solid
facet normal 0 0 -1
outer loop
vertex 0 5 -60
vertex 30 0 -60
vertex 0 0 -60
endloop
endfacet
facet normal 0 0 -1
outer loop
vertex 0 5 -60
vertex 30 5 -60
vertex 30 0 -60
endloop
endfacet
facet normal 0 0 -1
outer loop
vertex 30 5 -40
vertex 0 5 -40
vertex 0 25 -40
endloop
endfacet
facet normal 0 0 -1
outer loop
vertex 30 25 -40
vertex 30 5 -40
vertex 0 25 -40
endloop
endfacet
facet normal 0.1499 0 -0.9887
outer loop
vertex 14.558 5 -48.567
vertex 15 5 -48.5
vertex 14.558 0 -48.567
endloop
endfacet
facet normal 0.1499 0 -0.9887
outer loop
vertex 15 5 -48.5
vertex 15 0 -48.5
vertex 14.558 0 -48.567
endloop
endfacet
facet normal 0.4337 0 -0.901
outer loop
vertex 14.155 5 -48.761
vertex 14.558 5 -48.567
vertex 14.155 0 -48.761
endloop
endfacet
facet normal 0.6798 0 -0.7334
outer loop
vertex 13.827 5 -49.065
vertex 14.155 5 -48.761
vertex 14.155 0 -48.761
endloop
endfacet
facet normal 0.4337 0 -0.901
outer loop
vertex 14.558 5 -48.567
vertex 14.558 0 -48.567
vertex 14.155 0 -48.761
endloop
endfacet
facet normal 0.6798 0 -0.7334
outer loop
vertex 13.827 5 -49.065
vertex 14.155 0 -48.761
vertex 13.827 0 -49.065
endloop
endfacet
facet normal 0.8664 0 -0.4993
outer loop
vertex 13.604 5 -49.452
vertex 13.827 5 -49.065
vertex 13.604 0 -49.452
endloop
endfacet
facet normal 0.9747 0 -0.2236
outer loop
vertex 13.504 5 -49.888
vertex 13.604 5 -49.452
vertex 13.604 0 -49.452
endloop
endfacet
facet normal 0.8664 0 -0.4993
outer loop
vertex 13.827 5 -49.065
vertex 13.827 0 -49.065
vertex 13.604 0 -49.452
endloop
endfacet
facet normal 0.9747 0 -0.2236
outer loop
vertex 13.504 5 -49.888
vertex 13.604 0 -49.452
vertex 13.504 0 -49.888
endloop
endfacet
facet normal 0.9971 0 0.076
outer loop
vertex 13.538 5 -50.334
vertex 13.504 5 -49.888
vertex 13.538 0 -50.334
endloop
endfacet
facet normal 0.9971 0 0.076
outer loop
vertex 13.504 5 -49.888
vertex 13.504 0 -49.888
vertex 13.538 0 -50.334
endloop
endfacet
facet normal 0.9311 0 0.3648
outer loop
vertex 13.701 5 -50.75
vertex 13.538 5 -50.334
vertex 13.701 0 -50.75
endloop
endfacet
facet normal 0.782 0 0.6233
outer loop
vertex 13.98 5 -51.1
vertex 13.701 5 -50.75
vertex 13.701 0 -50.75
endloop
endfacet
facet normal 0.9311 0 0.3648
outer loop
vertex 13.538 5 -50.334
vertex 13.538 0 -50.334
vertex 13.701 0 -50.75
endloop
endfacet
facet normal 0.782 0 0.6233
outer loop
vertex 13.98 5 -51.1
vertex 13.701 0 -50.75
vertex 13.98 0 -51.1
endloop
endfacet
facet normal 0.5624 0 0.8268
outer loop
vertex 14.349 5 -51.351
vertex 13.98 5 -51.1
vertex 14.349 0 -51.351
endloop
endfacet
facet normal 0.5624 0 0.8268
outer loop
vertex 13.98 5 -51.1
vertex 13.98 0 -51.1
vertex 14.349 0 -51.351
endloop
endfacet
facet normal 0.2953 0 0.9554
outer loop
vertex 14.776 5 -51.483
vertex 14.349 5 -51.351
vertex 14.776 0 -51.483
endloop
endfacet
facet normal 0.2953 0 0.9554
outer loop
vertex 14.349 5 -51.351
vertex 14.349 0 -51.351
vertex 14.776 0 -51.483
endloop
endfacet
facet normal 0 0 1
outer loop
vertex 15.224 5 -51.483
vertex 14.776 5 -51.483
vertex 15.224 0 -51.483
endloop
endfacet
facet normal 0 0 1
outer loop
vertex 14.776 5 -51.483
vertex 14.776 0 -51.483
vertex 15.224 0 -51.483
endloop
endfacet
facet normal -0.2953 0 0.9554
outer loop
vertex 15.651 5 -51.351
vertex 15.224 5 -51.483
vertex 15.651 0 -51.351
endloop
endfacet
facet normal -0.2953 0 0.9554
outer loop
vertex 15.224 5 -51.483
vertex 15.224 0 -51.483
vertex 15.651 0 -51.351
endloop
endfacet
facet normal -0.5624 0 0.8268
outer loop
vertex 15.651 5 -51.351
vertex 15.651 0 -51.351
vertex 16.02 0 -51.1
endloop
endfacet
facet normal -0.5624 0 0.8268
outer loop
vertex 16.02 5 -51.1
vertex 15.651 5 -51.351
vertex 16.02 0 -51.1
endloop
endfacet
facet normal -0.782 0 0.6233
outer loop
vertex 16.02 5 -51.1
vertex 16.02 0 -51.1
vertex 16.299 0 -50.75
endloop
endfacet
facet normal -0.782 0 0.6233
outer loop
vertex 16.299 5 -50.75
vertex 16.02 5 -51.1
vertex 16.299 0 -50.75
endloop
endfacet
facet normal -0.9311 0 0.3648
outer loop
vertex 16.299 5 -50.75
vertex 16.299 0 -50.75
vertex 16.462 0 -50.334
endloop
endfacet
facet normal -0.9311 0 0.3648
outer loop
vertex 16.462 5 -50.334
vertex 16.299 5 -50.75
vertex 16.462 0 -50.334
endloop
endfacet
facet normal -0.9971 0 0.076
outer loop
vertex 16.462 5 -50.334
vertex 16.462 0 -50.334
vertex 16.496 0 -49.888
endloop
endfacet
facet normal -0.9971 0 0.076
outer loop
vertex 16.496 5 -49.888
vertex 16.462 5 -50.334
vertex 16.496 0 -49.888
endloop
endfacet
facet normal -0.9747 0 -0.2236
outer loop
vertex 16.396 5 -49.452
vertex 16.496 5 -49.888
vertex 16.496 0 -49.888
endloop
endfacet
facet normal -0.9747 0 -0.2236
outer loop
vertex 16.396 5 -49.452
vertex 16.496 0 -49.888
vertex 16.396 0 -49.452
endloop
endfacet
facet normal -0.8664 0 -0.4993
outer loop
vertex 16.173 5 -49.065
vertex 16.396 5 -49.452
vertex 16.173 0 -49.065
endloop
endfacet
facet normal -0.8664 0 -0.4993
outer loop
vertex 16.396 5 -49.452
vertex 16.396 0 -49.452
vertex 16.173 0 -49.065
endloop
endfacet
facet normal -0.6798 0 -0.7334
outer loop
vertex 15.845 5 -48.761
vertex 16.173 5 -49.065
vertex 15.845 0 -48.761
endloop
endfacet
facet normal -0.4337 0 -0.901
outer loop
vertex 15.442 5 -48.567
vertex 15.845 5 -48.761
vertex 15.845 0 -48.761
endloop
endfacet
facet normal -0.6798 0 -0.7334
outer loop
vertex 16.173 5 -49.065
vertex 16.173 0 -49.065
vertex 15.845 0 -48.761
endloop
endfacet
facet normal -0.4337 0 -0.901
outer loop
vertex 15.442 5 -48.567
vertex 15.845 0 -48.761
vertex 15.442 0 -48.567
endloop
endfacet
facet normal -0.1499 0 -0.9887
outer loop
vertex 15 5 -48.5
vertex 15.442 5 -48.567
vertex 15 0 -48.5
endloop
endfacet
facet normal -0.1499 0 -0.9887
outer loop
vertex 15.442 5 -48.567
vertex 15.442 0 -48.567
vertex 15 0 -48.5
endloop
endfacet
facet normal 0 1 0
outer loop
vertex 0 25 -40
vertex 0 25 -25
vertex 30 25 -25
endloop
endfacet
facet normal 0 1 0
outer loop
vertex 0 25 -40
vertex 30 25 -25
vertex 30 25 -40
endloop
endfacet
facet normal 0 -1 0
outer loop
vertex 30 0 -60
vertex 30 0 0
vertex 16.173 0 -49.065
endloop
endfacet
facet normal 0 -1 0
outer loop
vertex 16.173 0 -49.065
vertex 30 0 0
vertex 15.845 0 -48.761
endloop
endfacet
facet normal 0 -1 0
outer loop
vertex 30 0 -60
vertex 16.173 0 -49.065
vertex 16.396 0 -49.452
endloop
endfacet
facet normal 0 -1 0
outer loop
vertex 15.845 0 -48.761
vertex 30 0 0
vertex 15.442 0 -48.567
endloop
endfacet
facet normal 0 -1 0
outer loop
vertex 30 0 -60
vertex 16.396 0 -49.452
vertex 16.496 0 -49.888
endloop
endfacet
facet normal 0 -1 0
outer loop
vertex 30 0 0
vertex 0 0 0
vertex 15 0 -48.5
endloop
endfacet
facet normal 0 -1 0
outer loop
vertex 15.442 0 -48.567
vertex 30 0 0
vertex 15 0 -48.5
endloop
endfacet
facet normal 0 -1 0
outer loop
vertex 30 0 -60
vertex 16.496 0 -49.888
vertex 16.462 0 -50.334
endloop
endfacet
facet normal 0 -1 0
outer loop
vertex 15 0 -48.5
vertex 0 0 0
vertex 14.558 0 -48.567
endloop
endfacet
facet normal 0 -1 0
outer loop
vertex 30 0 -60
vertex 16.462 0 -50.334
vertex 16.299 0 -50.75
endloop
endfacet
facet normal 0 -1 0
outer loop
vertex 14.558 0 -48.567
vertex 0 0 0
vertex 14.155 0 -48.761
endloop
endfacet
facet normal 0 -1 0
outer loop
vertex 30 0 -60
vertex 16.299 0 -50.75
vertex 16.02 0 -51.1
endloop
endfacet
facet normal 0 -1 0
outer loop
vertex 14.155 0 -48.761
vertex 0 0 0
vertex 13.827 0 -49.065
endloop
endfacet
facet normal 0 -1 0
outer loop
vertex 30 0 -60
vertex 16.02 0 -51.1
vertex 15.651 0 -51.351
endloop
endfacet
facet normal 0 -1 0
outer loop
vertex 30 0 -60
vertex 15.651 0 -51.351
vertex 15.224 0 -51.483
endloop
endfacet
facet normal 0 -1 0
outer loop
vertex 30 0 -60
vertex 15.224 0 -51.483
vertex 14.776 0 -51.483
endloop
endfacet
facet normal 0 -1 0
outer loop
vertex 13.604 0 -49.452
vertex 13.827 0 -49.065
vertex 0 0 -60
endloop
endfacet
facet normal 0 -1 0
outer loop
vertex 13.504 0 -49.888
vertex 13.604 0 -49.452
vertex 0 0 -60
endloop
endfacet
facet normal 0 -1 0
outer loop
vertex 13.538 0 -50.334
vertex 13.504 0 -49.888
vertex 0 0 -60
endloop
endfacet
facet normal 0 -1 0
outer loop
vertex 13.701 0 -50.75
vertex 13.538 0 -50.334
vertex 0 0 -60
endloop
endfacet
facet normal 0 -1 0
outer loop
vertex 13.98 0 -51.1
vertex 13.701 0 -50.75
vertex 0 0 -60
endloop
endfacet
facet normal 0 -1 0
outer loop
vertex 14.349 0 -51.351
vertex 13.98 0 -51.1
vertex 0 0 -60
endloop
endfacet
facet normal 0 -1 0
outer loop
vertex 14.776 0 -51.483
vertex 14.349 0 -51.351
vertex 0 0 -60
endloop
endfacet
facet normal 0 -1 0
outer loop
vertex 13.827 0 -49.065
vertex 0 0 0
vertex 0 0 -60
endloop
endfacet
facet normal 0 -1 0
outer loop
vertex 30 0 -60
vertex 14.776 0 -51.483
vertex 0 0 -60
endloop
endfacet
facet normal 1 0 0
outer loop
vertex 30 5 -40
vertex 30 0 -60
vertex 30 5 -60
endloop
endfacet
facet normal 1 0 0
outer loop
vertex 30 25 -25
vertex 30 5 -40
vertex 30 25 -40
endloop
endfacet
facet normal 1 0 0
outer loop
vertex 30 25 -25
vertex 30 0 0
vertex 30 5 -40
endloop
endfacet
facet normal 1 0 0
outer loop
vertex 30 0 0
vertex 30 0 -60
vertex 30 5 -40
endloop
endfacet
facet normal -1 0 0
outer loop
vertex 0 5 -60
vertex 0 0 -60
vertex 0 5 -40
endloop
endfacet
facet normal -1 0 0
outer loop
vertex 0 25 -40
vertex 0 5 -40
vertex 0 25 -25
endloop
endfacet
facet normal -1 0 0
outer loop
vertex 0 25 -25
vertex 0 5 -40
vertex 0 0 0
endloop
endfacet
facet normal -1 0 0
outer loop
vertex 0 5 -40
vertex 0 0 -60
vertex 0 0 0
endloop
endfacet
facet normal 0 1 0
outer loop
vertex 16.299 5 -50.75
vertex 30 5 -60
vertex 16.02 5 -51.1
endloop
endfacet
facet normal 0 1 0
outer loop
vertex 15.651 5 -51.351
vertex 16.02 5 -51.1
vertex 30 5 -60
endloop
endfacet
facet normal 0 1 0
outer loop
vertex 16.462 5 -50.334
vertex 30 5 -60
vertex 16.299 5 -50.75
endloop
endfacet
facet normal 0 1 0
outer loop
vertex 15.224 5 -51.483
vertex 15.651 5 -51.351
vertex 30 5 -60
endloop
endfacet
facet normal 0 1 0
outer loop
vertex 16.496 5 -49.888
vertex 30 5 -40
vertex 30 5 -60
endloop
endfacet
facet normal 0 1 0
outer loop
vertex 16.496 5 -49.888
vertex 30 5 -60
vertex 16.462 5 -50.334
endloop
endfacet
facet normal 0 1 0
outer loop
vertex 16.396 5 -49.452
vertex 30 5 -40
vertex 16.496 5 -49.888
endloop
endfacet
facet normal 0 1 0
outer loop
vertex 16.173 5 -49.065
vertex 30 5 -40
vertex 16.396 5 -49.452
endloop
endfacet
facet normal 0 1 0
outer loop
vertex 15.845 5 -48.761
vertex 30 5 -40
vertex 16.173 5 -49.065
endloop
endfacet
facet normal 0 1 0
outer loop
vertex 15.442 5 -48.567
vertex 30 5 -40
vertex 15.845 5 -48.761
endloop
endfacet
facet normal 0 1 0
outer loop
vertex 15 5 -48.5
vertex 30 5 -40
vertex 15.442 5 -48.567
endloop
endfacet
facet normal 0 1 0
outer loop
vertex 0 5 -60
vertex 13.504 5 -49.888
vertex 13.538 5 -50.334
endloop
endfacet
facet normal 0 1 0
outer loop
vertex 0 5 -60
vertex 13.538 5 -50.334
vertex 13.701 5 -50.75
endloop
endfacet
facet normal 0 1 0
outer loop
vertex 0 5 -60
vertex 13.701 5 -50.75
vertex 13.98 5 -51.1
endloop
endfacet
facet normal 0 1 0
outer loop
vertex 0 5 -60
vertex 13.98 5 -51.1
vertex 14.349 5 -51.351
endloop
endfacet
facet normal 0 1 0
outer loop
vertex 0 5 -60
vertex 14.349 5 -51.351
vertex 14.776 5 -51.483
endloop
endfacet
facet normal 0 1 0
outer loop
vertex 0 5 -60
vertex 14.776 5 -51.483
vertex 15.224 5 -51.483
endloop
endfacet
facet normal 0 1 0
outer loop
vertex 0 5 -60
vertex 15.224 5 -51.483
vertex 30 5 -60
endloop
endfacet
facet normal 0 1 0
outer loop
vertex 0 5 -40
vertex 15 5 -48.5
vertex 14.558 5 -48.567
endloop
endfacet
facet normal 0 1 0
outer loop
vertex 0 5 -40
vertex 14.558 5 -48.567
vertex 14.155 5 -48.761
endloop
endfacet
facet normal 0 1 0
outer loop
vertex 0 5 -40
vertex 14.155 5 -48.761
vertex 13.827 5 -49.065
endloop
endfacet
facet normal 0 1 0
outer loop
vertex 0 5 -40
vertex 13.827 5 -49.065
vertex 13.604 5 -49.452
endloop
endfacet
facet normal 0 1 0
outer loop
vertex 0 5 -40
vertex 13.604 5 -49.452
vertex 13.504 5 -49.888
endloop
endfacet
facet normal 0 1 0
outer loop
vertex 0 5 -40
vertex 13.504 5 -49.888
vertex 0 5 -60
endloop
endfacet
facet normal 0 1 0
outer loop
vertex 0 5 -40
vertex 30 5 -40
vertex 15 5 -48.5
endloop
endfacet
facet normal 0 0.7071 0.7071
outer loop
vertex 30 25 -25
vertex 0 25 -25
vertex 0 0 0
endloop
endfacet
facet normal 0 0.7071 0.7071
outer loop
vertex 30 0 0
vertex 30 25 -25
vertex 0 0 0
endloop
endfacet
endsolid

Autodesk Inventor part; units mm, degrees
ref_plane "YZ Plane" through (0, 0, 0) normal (1, 0, 0) x (0, 1, 0)
ref_plane "XZ Plane" through (0, 0, 0) normal (0, 1, 0) x (-1, 0, 0)
ref_plane "XY Plane" through (0, 0, 0) normal (0, 0, 1) x (1, 0, 0)
sketch "Skizze1" plane through (0, 0, 0) normal (1, 0, 0) x (0, 1, 0)
  line L0 (0, 0) -> (0, -40)
  line L1 (0, -40) -> (40, -40)
  line L2 (40, -40) -> (0, 0)
  dimension "d0" = 45
  dimension "d1" = 40
extrude "Extrusion1" add sketch "Skizze1" along normal blind 30
sketch "Skizze4" plane through (0, 0, -40) normal (0, 0, -1) x (-1, 0, 0)
  line L0 (-30, 0) -> (-30, 40) projected
  line L1 (0, 0) -> (-30, 0)
  line L2 (-30, 0) -> (-30, 5)
  line L3 (-30, 5) -> (0, 5)
  line L4 (0, 5) -> (0, 0)
  dimension "d19" = 5
extrude "Extrusion2" add sketch "Skizze4" along normal blind 20
sketch "Skizze5" plane through (0, 5, -40) normal (0, 1, 0) x (1, 0, 0)
  line L0 (30, 20) -> (0, 20) construction
  line L1 (15, 20) -> (15, 0) construction
  line L2 (0, 0) -> (30, 0) construction
  line L3 (0, 0) -> (0, 20) construction
  line L4 (30, 0) -> (0, 0) construction
  line L5 (30, 0) -> (30, 20) construction
  line L6 (0, 20) -> (30, 20) construction
  line L7 (0, 0) -> (0, 20) construction
  line L8 (0, 10) -> (30, 10) construction
  point P0 (0, -40)
  point P1 (15, 10)
hole "Bohrung2" at (15, 5, -50) direction (0, -1, 0) diameter 3 end through all
sketch "Skizze6" plane through (30, 0, 0) normal (1, 0, 0) x (0, 0, -1)
  line L0 (40, 5) -> (40, 40) projected
  line L1 (40, 40) -> (20, 40)
  line L2 (20, 40) -> (20, 25)
  line L3 (20, 25) -> (40, 25)
  line L4 (40, 25) -> (40, 40)
  point P0 (0, 0)
  dimension "d29" = 15
  dimension "d30" = 20
extrude "Extrusion3" cut sketch "Skizze6" against normal through all
properties part number "spiegelhalter"
